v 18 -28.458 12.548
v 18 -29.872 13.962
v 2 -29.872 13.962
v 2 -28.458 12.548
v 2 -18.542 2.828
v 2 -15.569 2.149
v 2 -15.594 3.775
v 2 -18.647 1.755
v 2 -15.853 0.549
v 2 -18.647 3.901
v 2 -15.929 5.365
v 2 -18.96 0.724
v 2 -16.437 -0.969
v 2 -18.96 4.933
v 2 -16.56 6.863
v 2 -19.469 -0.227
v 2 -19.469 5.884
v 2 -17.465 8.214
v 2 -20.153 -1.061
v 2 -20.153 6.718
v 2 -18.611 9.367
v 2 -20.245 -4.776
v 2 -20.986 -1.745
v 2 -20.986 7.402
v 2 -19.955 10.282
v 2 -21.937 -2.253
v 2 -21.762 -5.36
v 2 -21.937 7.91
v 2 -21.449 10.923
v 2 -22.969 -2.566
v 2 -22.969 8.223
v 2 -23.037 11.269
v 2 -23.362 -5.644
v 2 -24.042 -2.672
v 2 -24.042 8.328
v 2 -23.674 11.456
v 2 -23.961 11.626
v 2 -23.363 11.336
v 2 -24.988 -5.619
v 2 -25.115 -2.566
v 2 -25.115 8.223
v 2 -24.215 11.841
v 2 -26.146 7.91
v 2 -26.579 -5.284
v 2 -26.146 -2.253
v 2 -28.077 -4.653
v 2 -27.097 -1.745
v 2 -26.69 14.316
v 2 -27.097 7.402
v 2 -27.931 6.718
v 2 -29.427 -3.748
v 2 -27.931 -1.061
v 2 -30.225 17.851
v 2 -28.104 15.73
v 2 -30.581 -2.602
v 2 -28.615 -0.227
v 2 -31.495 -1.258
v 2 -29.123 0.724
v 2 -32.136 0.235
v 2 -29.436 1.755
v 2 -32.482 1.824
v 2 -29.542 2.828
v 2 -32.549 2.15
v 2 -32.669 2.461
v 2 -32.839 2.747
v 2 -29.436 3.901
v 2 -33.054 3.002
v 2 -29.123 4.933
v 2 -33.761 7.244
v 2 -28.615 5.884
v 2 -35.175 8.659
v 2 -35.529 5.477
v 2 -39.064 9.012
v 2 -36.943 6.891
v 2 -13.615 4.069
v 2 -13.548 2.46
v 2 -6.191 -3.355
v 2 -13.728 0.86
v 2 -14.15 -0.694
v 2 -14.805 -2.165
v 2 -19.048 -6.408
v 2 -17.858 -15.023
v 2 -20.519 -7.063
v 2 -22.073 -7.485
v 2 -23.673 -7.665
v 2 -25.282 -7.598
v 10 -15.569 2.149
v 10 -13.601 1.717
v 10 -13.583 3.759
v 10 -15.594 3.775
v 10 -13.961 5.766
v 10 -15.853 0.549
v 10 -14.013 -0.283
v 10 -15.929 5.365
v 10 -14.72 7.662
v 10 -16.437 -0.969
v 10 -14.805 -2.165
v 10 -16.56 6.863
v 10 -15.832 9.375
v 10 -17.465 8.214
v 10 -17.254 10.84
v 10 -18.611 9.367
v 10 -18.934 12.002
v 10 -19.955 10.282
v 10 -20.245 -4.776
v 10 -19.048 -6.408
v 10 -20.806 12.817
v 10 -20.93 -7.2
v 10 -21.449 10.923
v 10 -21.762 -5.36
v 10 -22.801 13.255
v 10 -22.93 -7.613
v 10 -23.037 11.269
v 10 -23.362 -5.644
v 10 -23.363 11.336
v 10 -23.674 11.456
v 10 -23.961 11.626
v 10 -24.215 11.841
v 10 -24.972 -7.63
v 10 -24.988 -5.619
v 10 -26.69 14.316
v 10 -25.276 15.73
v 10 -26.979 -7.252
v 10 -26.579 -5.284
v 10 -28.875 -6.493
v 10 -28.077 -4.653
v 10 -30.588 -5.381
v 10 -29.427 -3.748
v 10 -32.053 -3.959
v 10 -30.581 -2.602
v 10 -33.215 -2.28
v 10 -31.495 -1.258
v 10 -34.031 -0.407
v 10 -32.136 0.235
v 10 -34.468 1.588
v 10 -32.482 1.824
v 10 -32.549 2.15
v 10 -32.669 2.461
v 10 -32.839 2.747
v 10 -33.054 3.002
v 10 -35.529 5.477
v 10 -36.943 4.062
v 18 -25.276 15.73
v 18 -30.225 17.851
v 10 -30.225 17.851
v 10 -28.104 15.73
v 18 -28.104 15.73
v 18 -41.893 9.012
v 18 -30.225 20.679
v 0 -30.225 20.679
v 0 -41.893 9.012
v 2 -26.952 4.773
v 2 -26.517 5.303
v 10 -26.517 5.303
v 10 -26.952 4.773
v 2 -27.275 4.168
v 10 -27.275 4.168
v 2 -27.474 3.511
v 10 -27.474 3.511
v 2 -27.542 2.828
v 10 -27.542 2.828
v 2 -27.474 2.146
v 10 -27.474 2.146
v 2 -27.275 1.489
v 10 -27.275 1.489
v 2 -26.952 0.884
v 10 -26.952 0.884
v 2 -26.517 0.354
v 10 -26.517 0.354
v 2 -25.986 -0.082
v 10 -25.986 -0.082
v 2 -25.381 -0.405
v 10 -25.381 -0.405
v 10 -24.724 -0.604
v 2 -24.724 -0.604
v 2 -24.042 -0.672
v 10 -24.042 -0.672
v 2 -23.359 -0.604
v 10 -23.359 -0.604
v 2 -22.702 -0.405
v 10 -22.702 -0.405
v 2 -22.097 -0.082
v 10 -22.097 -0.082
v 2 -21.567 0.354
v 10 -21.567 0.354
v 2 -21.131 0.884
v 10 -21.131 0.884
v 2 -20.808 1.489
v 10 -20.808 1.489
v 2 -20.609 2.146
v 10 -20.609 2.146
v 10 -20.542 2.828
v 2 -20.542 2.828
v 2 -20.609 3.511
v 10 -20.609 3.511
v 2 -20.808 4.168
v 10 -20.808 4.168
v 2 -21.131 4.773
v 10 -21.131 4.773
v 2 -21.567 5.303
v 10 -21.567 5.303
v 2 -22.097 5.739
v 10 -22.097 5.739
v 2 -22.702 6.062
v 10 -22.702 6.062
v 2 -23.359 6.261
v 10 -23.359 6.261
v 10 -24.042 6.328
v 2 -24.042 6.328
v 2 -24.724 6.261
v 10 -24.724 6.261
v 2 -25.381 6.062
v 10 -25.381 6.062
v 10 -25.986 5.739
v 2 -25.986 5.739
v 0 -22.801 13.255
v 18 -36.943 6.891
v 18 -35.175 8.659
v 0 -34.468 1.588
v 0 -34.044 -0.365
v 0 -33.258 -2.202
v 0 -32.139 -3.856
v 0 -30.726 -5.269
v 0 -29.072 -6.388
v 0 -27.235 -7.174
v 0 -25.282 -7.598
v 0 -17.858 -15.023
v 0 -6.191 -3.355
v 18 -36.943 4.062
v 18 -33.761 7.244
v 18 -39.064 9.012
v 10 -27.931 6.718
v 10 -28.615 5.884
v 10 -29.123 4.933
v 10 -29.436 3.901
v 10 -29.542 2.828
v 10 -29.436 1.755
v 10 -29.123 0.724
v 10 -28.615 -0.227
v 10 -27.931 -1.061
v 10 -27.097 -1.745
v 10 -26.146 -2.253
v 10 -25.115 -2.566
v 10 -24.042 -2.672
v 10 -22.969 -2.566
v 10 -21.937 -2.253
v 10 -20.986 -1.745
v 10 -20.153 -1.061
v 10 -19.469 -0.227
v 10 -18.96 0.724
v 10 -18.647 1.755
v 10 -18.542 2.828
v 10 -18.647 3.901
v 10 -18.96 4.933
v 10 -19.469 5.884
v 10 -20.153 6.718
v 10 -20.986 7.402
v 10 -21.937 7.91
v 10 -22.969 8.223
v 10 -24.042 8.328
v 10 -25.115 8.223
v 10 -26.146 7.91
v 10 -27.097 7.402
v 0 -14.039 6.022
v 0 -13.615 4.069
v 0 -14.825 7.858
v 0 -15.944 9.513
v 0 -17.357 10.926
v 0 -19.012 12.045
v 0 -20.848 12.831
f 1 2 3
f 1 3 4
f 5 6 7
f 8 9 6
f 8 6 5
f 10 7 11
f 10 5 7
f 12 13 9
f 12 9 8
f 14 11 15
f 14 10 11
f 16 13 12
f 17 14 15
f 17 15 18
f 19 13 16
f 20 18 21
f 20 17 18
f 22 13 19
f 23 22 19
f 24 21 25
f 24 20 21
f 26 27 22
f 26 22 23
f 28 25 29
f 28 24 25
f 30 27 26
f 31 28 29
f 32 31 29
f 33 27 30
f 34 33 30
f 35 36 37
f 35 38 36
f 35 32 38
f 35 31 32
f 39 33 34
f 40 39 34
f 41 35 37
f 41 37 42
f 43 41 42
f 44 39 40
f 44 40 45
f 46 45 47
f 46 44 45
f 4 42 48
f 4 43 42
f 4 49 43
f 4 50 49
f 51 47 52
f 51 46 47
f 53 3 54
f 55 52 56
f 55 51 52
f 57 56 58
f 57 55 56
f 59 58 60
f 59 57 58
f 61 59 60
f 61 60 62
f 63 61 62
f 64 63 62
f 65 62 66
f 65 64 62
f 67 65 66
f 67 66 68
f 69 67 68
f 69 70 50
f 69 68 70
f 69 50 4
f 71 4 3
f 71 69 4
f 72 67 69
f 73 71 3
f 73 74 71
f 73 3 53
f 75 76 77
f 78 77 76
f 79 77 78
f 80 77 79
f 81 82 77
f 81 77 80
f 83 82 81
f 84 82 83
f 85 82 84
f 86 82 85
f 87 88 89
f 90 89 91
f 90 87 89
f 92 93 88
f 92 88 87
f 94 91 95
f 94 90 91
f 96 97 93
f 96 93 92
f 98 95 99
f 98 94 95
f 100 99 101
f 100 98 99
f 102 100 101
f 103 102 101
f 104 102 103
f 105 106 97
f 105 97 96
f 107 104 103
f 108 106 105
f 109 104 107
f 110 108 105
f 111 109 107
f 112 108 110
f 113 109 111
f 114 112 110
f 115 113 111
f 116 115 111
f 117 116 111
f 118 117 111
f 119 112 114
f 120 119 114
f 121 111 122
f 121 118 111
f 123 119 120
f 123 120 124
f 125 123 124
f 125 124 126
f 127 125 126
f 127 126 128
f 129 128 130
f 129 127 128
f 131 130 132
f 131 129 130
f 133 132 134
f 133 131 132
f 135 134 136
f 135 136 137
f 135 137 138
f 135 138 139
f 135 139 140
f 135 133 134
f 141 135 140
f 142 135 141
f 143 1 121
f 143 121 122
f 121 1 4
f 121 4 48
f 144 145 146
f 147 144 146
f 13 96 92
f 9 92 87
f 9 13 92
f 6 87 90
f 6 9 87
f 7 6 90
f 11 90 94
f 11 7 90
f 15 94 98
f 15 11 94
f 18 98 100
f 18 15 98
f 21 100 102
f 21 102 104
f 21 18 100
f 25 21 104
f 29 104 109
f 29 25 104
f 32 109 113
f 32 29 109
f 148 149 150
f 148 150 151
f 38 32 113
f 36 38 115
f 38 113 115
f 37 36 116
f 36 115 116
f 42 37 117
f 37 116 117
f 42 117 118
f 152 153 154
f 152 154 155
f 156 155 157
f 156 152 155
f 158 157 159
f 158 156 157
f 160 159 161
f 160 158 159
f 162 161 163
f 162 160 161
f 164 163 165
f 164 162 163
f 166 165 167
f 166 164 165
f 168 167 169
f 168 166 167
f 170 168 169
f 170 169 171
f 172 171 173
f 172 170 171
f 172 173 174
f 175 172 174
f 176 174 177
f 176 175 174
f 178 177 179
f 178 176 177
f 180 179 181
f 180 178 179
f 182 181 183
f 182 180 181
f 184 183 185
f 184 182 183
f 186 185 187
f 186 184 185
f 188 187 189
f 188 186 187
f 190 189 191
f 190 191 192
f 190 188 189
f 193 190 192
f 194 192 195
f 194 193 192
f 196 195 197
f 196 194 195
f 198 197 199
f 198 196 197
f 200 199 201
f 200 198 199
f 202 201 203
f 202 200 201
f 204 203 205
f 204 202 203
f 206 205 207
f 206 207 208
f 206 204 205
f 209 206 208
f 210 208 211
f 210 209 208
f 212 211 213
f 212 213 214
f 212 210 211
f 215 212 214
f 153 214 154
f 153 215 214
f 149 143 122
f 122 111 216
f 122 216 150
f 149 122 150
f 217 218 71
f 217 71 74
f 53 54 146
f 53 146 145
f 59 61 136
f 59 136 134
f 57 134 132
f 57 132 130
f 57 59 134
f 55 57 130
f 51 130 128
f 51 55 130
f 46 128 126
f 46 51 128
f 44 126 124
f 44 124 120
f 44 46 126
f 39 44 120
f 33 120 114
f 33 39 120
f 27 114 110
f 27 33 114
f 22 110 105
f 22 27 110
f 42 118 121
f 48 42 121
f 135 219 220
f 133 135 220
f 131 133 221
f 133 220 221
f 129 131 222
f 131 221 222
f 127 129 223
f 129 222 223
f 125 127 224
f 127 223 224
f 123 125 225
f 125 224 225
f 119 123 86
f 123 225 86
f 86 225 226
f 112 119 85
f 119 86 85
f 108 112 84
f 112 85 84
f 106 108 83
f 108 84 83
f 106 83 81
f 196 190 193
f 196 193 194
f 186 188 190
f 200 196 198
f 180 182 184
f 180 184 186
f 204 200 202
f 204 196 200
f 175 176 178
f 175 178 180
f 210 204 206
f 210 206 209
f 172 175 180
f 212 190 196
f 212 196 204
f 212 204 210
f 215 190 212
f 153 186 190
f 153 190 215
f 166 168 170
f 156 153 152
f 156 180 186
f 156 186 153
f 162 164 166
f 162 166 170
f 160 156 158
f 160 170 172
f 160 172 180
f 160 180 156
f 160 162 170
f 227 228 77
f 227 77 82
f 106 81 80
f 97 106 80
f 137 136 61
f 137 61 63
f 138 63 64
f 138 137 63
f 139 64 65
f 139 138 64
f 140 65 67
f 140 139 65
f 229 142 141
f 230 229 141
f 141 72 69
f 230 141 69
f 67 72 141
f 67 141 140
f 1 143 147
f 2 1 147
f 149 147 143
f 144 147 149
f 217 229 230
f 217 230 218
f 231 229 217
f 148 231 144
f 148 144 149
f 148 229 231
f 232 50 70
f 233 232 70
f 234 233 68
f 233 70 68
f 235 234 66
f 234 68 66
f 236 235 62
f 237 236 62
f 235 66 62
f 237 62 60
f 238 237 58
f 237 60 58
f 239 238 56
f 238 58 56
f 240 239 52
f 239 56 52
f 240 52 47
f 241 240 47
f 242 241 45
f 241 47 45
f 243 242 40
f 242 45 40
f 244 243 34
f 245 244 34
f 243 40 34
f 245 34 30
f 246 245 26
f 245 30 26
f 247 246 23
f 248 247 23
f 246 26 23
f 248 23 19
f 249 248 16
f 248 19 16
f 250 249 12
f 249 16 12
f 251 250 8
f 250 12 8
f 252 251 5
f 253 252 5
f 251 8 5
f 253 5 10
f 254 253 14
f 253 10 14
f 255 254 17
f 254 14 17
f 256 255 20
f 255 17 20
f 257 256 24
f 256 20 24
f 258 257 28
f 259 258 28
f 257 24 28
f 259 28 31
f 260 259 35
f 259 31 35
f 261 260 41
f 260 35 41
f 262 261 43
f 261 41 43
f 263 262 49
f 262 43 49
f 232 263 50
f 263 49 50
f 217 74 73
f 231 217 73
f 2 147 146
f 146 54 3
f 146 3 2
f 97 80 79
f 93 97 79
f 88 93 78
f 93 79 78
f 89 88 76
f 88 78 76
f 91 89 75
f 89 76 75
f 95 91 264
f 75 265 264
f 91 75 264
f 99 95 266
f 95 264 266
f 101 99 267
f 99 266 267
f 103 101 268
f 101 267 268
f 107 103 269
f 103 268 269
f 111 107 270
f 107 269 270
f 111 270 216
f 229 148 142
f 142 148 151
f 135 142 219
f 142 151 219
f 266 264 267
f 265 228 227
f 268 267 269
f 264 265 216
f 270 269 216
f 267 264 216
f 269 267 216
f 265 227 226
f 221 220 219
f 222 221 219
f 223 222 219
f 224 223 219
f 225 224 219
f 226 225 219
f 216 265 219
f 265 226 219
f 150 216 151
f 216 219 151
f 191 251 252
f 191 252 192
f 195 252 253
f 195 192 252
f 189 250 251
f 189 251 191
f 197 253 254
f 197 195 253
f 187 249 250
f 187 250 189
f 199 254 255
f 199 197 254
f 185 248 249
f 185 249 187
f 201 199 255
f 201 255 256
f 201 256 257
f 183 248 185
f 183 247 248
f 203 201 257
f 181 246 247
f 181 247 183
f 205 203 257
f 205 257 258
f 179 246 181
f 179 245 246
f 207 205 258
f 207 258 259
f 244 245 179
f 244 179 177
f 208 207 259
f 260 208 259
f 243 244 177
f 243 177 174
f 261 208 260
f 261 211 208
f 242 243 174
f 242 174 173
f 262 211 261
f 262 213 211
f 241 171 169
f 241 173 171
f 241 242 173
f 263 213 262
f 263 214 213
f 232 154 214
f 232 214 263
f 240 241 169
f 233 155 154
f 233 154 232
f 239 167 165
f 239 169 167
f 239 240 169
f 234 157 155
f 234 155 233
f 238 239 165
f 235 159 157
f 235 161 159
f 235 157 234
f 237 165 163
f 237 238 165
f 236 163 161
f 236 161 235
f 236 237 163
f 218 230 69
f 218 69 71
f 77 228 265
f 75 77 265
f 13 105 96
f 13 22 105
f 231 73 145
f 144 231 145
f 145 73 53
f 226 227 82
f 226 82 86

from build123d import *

# Parameters (mm, degrees)
PAD_DEPTH            = 10
THICKNESS_T          = -2
PAD001_DEPTH         = 18
SKETCH002_R          = 5.5
SKETCH002_R_2        = 3.5
PAD002_DEPTH         = 8
SKETCH003_W          = 33.990382
SKETCH003_H          = 16.5
PAD003_DEPTH         = 2
BODY_PLACEMENT_ANGLE = 134.999996


with BuildPart() as part:
    # Sketch → Pad (new body)
    with BuildSketch(Plane.YZ):
        with BuildLine():
            ThreePointArc((6.495191, 8.25), (-3.173595, 10.008911), (-10.062306, 3))
            Line((-10.062306, 3), (-10.062306, -3))
            ThreePointArc((-10.062306, -3), (-3.173595, -10.008911), (6.495191, -8.25))
            Line((6.495191, -8.25), (16.995191, -8.25))
            Line((16.995191, -8.25), (16.995191, 8.25))
            Line((16.995191, 8.25), (6.495191, 8.25))
        make_face()
    extrude(amount=PAD_DEPTH)

    # Thickness
    thickness_openings = [part.faces().sort_by_distance(p)[0] for p in [
        (10, 3.557762, 0),
    ]]
    offset(amount=THICKNESS_T, openings=thickness_openings)

    # Sketch001 → Pad001 (join)
    with BuildSketch(Plane.YZ):
        Polygon((16.995191, 8.25), (9.995191, 8.25), (9.995191, 3.75), (11.995191, 3.75), (11.995191, 6.25), (14.995191, 6.25), (14.995191, -6.249983), (11.995191, -6.25), (11.995191, -3.75), (9.995191, -3.75), (9.995191, -8.25), (16.995191, -8.25), align=None)
    extrude(amount=PAD001_DEPTH)

    # Sketch002 (on Face22 of Pad001) → Pad002 (join)
    with BuildSketch(Plane.YZ.offset(2)):
        Circle(SKETCH002_R)
        Circle(SKETCH002_R_2, mode=Mode.SUBTRACT)
    extrude(amount=PAD002_DEPTH)

    # Sketch003 → Pad003 (join)
    with BuildSketch(Plane.YZ):
        Rectangle(SKETCH003_W, SKETCH003_H)
    extrude(amount=PAD003_DEPTH)


with BuildPart() as part_1:
    # Body placement: moved
    add(part.part.moved(Location((0, -24.041634, 2.828429))).rotate(Axis((0, -24.041634, 2.828429), (1, 0, 0)), BODY_PLACEMENT_ANGLE))


solid = part_1.part
